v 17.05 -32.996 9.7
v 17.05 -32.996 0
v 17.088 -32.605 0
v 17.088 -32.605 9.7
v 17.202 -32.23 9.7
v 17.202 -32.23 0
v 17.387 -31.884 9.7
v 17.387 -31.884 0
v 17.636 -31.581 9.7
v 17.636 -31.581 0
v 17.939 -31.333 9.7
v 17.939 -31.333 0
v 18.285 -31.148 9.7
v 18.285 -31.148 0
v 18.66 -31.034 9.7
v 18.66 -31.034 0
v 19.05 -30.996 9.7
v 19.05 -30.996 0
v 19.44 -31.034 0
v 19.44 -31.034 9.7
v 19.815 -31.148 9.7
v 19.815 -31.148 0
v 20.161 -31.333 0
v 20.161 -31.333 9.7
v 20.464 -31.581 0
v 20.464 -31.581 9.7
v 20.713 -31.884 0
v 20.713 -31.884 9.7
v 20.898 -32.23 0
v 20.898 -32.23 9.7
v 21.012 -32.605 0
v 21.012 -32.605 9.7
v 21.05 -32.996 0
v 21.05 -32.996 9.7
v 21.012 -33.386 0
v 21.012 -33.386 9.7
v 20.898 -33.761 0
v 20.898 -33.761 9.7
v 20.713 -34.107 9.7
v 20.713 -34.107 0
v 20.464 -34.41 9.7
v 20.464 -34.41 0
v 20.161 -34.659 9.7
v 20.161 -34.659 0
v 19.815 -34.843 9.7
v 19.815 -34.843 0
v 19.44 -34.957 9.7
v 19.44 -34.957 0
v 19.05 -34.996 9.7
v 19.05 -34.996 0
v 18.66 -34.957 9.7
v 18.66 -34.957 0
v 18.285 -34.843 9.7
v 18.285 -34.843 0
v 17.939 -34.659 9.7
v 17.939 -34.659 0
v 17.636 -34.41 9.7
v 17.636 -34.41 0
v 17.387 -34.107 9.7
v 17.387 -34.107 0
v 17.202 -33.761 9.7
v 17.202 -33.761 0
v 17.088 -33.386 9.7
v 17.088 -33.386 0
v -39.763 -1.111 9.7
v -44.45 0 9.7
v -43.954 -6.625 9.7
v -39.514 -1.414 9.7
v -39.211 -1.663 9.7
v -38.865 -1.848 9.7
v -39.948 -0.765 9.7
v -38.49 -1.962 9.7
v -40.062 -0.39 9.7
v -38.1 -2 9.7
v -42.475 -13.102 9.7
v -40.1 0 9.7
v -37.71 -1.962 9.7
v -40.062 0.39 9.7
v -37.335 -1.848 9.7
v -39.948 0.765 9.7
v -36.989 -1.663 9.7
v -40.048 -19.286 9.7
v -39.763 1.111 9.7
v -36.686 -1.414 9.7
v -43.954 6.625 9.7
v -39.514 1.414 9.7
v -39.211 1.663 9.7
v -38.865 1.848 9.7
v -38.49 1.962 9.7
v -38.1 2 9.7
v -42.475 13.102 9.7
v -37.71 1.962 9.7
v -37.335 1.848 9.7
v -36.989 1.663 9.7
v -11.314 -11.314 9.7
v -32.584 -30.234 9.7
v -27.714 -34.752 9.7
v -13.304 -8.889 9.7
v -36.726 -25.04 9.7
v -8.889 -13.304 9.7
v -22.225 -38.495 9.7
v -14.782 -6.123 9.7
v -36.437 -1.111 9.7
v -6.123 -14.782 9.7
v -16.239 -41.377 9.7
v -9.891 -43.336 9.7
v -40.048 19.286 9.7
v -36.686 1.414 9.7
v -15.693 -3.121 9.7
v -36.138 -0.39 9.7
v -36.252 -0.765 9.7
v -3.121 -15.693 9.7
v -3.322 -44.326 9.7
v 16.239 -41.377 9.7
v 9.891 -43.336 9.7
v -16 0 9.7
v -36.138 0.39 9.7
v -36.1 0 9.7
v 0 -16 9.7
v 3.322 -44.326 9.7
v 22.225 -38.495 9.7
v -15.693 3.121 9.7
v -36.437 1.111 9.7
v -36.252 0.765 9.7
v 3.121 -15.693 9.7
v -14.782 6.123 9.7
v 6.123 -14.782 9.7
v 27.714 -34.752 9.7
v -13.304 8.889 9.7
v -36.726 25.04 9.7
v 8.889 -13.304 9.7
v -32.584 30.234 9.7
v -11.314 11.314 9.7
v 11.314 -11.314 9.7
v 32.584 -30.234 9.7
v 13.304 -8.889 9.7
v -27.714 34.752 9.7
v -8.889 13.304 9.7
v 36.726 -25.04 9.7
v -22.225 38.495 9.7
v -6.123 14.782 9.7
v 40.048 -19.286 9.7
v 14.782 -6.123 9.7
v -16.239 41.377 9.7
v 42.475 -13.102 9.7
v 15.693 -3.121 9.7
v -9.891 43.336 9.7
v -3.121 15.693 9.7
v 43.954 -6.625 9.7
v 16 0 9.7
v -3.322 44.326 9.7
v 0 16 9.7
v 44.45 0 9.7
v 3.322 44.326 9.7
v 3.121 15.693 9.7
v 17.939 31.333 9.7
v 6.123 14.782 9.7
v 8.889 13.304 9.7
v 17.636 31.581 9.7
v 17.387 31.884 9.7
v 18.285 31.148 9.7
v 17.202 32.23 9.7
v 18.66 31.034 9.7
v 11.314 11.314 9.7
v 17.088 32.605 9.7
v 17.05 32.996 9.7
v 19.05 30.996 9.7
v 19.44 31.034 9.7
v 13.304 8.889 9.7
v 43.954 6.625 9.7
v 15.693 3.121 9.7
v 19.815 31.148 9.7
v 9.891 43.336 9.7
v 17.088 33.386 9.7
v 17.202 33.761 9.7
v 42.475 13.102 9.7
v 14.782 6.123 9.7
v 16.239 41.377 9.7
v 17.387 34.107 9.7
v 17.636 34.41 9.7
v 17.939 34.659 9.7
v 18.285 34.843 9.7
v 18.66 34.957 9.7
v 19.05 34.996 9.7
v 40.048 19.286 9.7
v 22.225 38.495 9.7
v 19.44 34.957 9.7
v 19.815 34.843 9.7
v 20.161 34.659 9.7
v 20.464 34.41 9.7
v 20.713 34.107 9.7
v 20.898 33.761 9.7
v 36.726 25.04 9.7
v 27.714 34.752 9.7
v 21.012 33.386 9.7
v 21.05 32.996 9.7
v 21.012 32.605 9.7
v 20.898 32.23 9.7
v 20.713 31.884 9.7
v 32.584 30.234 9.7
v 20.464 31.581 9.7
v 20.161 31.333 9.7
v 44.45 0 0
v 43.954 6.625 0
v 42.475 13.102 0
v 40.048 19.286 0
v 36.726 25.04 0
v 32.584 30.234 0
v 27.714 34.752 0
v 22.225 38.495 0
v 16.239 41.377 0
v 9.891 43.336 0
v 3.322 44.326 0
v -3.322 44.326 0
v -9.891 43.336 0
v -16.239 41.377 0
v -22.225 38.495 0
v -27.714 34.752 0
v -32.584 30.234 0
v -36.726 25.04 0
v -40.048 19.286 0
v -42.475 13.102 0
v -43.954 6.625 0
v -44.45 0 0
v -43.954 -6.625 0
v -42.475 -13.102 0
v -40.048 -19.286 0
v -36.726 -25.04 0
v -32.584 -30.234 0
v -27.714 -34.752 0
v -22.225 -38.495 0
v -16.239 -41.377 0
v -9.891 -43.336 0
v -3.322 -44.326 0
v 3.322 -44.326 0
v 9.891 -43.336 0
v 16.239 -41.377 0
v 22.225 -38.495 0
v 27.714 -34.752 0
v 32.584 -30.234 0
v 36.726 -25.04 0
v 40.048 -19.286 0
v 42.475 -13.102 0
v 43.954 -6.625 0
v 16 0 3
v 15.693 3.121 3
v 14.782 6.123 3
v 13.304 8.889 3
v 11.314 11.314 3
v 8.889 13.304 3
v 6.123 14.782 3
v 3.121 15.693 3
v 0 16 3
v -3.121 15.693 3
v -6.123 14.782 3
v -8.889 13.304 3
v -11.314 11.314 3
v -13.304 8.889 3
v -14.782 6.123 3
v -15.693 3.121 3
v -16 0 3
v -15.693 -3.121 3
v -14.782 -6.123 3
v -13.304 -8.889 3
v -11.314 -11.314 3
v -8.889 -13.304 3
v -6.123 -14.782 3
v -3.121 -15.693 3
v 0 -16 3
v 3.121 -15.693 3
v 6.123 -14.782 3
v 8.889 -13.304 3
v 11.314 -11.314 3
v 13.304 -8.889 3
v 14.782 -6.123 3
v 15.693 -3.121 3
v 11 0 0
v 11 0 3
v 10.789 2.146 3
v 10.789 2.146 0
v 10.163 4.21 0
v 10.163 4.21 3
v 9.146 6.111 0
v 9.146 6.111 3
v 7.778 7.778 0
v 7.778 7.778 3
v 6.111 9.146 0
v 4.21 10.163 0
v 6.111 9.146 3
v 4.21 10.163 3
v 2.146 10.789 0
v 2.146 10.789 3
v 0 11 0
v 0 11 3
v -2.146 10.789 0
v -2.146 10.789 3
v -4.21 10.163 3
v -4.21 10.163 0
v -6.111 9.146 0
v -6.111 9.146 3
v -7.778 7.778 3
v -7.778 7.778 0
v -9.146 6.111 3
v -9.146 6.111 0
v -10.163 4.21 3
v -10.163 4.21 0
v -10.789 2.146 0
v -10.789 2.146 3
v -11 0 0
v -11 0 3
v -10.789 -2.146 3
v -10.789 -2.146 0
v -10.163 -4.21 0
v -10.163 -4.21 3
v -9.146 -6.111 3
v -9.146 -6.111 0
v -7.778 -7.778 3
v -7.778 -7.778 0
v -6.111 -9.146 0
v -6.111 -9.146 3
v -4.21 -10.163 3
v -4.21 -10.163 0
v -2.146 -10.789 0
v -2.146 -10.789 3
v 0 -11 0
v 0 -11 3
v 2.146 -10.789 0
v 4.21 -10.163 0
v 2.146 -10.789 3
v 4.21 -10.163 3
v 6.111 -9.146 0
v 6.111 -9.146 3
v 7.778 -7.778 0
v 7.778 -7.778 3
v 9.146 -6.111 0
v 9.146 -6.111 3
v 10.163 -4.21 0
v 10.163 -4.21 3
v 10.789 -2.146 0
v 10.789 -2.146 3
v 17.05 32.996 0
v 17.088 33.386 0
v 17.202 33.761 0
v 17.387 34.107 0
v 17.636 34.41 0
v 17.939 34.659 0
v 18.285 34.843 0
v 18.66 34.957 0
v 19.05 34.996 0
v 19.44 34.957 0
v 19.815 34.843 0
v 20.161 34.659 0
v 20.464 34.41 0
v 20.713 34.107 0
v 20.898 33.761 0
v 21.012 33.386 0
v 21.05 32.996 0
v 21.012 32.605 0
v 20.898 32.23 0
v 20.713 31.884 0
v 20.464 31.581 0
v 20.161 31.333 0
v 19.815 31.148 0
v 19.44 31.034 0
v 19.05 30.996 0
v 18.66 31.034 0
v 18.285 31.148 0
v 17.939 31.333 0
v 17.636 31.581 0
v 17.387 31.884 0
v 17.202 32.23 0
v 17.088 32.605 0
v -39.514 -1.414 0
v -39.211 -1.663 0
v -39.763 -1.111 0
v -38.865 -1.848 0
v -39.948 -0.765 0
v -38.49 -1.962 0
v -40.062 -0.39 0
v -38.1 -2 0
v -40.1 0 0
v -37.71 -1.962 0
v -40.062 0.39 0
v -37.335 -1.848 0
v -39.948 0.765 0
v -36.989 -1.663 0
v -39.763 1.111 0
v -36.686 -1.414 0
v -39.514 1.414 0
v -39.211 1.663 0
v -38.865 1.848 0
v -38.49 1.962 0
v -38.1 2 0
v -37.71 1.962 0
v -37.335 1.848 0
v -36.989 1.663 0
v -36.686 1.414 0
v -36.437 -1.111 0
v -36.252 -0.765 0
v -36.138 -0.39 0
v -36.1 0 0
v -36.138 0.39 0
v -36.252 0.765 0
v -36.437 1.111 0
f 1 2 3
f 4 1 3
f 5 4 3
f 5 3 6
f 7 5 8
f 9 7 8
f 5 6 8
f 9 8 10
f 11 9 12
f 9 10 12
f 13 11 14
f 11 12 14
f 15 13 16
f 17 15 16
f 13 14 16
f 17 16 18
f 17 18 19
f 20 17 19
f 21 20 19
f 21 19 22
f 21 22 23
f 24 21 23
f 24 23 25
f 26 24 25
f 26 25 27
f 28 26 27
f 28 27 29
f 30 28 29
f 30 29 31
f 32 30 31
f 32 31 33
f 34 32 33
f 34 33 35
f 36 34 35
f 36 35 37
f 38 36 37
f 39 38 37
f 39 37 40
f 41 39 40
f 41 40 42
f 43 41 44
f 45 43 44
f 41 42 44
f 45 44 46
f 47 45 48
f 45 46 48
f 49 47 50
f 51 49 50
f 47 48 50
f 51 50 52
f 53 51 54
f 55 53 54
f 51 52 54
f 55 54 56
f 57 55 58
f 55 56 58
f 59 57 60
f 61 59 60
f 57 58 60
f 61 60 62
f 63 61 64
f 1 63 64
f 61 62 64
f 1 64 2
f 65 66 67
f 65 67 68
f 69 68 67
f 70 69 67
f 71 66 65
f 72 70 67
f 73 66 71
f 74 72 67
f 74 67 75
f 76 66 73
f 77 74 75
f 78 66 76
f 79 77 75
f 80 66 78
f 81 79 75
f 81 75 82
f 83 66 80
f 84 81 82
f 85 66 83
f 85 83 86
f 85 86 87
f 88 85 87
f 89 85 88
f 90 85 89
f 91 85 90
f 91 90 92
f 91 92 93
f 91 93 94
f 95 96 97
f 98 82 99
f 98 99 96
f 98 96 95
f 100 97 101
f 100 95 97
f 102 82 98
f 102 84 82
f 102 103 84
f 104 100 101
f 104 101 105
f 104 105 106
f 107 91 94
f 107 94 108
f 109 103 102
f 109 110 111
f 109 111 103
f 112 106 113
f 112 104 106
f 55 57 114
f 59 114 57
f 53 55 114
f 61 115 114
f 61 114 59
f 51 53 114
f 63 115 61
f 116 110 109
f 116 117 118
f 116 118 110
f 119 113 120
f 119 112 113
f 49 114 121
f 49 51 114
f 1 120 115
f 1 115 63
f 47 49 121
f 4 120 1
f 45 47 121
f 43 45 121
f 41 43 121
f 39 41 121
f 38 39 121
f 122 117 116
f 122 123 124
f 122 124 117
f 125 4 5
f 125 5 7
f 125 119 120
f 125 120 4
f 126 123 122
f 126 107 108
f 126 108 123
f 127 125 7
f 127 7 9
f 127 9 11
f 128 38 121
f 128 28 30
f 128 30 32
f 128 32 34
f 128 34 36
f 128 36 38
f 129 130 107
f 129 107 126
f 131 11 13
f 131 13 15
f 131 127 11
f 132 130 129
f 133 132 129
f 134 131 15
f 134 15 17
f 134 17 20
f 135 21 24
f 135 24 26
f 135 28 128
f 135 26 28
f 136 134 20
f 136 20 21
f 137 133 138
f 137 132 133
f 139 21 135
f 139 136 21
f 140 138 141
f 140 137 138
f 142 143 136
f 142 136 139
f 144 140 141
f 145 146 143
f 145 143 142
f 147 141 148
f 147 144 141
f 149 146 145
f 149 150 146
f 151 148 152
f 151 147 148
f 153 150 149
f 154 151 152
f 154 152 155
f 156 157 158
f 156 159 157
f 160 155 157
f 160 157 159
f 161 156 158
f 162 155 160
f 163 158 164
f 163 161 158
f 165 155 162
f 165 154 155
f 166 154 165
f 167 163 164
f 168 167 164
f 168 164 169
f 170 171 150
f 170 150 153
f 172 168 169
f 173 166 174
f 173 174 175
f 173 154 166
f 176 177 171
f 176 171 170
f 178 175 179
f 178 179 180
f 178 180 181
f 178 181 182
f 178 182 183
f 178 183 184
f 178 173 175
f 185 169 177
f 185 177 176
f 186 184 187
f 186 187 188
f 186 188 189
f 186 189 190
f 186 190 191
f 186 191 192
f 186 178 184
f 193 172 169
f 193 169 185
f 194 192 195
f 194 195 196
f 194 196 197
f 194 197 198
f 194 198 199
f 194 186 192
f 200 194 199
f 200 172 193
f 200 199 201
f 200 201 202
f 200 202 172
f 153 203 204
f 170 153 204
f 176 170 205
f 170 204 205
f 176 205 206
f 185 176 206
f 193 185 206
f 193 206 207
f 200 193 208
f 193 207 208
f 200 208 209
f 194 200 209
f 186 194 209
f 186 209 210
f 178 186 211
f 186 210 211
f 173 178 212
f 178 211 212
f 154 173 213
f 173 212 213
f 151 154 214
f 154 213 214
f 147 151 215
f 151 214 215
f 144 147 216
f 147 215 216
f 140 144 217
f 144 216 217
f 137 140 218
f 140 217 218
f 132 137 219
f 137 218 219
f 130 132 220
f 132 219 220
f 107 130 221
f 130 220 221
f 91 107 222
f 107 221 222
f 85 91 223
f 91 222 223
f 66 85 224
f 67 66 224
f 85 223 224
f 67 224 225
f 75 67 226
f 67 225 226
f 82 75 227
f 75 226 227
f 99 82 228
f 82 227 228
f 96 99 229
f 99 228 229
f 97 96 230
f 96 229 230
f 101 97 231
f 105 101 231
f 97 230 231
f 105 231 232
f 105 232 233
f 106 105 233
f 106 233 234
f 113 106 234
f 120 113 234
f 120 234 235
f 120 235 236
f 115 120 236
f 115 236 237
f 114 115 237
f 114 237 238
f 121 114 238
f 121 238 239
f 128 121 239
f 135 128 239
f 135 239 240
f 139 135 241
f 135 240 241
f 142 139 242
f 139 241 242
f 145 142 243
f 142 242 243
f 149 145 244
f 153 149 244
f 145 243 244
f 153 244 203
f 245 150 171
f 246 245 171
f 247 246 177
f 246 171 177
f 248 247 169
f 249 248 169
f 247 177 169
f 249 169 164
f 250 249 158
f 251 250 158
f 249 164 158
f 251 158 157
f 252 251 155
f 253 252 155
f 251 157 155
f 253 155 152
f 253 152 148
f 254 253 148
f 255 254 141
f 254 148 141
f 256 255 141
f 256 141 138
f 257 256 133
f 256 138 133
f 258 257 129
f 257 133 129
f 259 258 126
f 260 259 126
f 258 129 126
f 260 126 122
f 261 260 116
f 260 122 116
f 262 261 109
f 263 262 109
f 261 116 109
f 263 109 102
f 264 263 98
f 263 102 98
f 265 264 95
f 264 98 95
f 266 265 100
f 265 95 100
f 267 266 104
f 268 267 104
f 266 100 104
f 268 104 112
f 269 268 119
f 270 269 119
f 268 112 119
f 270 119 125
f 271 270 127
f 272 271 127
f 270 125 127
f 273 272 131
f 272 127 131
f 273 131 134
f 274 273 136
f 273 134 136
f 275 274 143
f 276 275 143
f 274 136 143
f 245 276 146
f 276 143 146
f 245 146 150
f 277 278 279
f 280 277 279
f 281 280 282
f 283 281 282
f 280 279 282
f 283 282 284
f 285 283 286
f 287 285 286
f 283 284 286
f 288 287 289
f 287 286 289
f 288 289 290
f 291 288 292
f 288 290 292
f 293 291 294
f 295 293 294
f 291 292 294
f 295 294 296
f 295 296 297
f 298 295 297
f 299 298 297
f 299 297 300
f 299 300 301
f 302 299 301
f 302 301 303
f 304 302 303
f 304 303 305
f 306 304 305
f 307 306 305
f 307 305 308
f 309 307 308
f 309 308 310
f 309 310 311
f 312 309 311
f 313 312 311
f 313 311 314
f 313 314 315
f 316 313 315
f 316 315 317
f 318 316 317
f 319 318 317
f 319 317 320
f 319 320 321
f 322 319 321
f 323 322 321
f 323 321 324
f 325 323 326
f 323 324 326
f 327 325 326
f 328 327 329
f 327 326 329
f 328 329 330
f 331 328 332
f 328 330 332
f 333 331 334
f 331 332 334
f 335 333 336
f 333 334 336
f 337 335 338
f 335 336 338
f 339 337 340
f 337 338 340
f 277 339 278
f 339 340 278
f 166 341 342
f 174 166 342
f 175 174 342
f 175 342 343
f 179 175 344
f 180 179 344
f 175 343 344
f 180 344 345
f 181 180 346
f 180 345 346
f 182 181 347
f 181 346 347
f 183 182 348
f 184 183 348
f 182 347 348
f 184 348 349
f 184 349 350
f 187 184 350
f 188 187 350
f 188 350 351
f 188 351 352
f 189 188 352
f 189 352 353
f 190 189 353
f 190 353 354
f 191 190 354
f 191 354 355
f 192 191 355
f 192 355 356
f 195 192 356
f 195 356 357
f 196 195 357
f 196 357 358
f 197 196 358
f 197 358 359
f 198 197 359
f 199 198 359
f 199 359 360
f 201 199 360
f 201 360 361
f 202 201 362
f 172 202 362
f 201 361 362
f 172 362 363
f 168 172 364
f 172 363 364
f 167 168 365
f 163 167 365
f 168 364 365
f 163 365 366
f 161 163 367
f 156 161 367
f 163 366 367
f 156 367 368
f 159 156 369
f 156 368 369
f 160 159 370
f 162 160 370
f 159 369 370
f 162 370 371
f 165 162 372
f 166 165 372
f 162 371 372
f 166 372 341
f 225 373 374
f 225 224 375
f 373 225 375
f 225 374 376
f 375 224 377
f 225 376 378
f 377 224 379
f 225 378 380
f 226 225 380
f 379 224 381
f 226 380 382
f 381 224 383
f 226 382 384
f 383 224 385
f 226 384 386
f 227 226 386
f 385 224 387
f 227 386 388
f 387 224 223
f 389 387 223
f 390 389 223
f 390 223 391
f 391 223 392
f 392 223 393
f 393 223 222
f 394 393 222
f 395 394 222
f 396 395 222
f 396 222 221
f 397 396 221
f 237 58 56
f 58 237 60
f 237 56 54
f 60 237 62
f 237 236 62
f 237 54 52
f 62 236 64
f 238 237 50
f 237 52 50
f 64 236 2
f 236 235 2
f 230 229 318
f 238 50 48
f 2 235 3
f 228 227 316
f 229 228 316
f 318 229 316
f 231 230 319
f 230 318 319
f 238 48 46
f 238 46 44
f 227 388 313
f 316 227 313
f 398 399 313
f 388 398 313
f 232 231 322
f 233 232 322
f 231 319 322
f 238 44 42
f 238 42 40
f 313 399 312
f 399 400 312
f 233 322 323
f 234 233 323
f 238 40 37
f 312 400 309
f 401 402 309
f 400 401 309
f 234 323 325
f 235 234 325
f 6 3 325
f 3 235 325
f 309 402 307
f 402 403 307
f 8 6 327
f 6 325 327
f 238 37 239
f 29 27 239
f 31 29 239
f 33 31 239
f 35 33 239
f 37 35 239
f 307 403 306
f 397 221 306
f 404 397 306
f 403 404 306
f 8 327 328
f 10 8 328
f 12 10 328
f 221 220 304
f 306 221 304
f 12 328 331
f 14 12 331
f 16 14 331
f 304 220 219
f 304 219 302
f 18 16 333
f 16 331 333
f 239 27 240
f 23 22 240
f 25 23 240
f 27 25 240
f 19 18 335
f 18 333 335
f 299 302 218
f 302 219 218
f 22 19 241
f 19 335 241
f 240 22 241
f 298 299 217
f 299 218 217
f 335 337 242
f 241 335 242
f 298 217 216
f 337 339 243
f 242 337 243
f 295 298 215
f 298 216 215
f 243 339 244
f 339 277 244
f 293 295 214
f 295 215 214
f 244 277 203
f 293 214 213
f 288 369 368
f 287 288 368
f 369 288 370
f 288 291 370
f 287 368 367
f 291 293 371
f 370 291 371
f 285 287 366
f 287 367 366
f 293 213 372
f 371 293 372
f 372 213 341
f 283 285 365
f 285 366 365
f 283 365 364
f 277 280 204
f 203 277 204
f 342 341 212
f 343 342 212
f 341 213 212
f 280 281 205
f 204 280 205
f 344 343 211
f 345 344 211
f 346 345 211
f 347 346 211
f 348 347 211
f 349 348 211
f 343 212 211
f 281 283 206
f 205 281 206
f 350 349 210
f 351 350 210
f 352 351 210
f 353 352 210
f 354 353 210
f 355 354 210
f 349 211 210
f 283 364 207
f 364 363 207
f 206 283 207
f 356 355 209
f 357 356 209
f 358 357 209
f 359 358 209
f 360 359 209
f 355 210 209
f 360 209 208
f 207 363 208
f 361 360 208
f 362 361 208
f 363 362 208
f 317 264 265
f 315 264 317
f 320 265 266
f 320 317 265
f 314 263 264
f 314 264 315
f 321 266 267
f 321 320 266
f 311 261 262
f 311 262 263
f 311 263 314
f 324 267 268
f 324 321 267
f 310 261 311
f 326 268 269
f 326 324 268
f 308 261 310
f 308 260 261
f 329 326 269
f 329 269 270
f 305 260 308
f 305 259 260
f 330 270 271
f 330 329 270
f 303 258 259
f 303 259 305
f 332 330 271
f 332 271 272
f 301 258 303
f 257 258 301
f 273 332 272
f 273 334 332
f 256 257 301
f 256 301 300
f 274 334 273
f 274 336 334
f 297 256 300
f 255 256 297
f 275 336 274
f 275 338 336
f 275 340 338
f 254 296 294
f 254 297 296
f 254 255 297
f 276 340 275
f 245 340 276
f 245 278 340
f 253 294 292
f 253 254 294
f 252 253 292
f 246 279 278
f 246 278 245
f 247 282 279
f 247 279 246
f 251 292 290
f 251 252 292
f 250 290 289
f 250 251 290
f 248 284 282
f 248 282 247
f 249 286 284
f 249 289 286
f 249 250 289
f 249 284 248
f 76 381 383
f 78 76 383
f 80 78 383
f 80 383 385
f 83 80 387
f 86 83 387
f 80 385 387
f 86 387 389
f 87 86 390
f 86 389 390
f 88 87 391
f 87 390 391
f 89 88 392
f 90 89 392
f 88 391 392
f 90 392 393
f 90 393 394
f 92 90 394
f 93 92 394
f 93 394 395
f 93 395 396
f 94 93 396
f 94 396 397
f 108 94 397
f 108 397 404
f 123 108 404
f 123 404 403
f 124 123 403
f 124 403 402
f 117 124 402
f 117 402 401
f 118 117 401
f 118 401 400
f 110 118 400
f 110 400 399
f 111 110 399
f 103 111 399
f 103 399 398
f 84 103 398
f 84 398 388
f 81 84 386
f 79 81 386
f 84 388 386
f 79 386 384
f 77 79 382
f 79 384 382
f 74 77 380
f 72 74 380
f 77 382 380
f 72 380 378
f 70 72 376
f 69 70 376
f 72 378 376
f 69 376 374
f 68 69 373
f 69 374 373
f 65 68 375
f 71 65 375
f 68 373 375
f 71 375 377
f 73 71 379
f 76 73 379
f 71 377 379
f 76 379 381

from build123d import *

# Parameters (mm, degrees)
SKETCH1_R           = 44.45
BOSS_EXTRUDE1_DEPTH = 9.7
SKETCH2_R           = 16
CUT_EXTRUDE1_DEPTH  = 6.7
SKETCH3_R           = 11
CUT_EXTRUDE2_DEPTH  = 9
SKETCH5_R           = 2
CUT_EXTRUDE4_DEPTH  = 10.7


with BuildPart() as part:
    # Sketch1 → Boss-Extrude1 (new body)
    with BuildSketch(Plane.XY):
        Circle(SKETCH1_R)
    extrude(amount=BOSS_EXTRUDE1_DEPTH)

    # Sketch2 → Cut-Extrude1 (cut)
    with BuildSketch(Plane.XY.offset(9.7)):
        Circle(SKETCH2_R)
    extrude(amount=-CUT_EXTRUDE1_DEPTH, mode=Mode.SUBTRACT)

    # Sketch3 → Cut-Extrude2 (cut)
    with BuildSketch(Plane.XY.offset(3)):
        Circle(SKETCH3_R)
    extrude(amount=-CUT_EXTRUDE2_DEPTH, mode=Mode.SUBTRACT)

    # Sketch5 → Cut-Extrude4 (cut, through all)
    with BuildSketch(Plane(origin=(0, 0, 0), x_dir=(-1, 0, 0), z_dir=(0, 0, -1))):
        with Locations((38.1, 0)):
            Circle(SKETCH5_R)
        with Locations((-19.05, -32.995567884)):
            Circle(SKETCH5_R)
        with Locations((-19.05, 32.995567884)):
            Circle(SKETCH5_R)
    extrude(amount=-CUT_EXTRUDE4_DEPTH, mode=Mode.SUBTRACT)


solid = part.part
